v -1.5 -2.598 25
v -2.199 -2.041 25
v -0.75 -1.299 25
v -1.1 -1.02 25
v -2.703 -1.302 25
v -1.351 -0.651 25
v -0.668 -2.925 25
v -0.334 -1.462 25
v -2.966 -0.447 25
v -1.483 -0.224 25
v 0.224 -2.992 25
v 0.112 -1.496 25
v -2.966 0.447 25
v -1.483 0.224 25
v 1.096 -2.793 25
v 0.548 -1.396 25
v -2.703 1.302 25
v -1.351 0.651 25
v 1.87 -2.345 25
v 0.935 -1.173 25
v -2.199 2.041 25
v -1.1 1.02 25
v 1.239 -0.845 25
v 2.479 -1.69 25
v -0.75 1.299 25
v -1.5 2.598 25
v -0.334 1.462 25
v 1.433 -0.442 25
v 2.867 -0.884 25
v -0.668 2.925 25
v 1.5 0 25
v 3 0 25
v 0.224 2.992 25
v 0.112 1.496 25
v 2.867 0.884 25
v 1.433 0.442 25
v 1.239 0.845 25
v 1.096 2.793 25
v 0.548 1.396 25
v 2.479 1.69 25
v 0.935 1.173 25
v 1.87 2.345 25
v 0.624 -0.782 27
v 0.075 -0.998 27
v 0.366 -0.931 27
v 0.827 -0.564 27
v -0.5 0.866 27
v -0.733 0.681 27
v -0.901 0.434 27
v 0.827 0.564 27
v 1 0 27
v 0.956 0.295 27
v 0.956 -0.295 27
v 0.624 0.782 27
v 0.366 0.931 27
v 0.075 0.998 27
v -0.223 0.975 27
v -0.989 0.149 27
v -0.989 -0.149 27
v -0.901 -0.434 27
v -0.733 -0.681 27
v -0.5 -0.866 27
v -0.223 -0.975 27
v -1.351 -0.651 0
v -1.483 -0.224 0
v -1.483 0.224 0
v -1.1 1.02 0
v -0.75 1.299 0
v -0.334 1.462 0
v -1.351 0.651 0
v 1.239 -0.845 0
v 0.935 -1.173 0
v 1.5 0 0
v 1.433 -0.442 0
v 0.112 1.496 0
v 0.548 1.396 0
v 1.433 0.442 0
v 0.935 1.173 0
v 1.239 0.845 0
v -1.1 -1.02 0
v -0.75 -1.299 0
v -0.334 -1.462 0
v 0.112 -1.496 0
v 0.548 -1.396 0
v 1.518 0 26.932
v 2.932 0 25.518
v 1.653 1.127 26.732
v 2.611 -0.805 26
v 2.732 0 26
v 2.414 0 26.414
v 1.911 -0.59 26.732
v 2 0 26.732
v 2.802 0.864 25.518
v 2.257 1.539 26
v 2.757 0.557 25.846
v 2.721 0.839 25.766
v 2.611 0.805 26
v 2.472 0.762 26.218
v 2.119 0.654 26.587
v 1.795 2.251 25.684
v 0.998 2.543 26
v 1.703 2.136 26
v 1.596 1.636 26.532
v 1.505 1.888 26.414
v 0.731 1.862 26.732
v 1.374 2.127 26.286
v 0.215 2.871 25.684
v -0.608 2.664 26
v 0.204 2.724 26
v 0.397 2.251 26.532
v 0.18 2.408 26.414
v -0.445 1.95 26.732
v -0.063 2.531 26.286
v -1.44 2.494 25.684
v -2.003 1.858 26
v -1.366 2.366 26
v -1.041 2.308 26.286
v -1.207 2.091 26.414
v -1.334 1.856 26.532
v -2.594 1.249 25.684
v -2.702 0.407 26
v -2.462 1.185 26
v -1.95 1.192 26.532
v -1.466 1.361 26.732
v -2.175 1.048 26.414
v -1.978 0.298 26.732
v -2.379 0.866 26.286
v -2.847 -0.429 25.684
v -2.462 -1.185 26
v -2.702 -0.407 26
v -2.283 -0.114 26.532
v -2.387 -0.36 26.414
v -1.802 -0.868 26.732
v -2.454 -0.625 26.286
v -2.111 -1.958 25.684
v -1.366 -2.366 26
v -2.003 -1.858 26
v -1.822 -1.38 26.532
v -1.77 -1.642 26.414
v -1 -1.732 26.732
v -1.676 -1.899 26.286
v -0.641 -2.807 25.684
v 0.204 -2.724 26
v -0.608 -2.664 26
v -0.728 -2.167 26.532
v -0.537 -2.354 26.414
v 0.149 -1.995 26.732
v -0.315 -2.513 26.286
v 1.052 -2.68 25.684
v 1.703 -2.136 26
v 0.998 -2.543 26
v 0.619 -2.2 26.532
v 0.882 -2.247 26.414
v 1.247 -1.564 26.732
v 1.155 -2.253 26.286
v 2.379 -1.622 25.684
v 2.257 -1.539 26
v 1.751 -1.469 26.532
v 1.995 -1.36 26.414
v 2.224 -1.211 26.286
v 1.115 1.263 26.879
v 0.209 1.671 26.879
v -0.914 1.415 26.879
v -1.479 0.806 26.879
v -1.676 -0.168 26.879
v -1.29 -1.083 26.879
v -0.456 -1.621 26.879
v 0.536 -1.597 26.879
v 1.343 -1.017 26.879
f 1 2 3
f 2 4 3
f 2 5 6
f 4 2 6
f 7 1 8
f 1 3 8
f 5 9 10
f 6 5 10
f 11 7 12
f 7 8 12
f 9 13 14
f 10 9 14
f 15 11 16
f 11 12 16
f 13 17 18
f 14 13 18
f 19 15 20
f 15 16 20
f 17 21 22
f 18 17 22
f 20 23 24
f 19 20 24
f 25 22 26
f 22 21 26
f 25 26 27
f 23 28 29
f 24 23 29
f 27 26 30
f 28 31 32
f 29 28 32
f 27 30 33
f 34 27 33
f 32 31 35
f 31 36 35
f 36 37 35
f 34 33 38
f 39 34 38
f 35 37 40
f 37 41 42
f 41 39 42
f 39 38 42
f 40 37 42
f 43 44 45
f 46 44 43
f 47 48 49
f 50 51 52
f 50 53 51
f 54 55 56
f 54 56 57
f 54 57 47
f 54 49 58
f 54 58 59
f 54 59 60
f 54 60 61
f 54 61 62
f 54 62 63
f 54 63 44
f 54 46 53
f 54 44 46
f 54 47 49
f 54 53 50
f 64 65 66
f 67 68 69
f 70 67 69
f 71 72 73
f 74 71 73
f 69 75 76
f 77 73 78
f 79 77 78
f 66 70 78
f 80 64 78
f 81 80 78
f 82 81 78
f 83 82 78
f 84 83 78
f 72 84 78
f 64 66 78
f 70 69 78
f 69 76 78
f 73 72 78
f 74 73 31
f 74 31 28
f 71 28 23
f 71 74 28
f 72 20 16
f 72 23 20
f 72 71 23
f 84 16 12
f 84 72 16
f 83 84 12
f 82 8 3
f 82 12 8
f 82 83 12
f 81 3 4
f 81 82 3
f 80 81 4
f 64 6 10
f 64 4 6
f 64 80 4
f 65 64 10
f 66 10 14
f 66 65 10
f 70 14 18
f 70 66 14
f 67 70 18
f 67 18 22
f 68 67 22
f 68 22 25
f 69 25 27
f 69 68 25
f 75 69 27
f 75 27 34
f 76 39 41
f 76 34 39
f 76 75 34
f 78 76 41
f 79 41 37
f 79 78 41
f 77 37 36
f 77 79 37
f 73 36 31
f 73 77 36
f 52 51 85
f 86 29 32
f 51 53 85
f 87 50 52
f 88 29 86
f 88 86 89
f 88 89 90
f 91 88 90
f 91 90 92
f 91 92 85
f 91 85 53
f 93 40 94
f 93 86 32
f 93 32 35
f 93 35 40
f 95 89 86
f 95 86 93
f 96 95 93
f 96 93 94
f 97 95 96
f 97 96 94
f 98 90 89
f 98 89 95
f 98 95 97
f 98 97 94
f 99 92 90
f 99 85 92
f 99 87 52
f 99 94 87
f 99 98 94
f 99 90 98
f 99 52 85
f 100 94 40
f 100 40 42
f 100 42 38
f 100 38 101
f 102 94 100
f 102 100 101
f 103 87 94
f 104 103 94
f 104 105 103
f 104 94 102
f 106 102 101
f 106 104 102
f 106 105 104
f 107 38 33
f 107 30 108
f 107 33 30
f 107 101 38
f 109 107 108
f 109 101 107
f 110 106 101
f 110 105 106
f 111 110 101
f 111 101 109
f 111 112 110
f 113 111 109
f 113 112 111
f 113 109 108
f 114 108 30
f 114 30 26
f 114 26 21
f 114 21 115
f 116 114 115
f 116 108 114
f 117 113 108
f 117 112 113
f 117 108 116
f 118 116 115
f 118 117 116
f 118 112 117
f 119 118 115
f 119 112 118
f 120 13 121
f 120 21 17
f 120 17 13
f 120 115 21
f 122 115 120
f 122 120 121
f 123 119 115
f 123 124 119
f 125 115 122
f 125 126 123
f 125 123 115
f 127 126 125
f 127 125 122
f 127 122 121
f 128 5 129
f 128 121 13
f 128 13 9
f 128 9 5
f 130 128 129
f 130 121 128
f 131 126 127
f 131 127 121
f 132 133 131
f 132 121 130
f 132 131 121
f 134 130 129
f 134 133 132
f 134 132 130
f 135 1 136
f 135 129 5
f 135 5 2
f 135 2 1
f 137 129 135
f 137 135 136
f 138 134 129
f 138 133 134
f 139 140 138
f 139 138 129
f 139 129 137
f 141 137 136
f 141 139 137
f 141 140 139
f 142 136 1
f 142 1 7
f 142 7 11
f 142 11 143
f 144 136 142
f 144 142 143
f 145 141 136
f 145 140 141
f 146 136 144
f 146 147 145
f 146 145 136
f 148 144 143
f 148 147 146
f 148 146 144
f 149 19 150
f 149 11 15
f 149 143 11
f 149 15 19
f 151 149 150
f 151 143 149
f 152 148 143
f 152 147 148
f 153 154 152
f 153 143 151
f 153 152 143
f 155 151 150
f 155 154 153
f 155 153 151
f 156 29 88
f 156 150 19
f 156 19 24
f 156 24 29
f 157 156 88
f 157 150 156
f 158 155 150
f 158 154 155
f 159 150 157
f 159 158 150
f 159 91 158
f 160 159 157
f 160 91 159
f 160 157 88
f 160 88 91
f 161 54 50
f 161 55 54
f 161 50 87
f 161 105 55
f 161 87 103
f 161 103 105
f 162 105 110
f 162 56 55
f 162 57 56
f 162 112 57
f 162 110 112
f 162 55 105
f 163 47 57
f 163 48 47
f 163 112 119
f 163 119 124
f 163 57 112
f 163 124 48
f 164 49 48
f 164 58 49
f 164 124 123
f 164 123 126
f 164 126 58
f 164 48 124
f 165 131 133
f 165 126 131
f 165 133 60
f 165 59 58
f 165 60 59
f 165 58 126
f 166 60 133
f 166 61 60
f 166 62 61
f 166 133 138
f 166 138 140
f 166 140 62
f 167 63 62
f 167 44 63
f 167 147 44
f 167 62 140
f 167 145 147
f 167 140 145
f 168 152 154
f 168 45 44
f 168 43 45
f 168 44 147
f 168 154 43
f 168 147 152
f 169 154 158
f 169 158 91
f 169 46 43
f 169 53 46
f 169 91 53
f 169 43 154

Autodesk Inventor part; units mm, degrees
ref_plane "YZ Plane" through (0, 0, 0) normal (1, 0, 0) x (0, 1, 0)
ref_plane "XZ Plane" through (0, 0, 0) normal (0, 1, 0) x (-1, 0, 0)
ref_plane "XY Plane" through (0, 0, 0) normal (0, 0, 1) x (1, 0, 0)
sketch "スケッチ1" plane through (0, 0, 0) normal (0, 0, 1) x (1, 0, 0)
  circle A0 centre (0, 0) radius 1.5
  dimension "d0" = 3
extrude "押し出し1" add sketch "スケッチ1" along normal blind 25
sketch "スケッチ2" plane through (0, 0, 25) normal (0, 0, 1) x (1, 0, 0)
  circle A0 centre (0, 0) radius 1.5 projected
  circle A1 centre (0, 0) radius 3
  dimension "d3" = 6
extrude "押し出し2" add sketch "スケッチ2" along normal blind 2 contours A0 | A1
fillet "フィレット1" radius 2 1 edges at (-3, 0, 27)
properties part number "M3ボタンボルト20" material "鋼、高強度、低合金"
